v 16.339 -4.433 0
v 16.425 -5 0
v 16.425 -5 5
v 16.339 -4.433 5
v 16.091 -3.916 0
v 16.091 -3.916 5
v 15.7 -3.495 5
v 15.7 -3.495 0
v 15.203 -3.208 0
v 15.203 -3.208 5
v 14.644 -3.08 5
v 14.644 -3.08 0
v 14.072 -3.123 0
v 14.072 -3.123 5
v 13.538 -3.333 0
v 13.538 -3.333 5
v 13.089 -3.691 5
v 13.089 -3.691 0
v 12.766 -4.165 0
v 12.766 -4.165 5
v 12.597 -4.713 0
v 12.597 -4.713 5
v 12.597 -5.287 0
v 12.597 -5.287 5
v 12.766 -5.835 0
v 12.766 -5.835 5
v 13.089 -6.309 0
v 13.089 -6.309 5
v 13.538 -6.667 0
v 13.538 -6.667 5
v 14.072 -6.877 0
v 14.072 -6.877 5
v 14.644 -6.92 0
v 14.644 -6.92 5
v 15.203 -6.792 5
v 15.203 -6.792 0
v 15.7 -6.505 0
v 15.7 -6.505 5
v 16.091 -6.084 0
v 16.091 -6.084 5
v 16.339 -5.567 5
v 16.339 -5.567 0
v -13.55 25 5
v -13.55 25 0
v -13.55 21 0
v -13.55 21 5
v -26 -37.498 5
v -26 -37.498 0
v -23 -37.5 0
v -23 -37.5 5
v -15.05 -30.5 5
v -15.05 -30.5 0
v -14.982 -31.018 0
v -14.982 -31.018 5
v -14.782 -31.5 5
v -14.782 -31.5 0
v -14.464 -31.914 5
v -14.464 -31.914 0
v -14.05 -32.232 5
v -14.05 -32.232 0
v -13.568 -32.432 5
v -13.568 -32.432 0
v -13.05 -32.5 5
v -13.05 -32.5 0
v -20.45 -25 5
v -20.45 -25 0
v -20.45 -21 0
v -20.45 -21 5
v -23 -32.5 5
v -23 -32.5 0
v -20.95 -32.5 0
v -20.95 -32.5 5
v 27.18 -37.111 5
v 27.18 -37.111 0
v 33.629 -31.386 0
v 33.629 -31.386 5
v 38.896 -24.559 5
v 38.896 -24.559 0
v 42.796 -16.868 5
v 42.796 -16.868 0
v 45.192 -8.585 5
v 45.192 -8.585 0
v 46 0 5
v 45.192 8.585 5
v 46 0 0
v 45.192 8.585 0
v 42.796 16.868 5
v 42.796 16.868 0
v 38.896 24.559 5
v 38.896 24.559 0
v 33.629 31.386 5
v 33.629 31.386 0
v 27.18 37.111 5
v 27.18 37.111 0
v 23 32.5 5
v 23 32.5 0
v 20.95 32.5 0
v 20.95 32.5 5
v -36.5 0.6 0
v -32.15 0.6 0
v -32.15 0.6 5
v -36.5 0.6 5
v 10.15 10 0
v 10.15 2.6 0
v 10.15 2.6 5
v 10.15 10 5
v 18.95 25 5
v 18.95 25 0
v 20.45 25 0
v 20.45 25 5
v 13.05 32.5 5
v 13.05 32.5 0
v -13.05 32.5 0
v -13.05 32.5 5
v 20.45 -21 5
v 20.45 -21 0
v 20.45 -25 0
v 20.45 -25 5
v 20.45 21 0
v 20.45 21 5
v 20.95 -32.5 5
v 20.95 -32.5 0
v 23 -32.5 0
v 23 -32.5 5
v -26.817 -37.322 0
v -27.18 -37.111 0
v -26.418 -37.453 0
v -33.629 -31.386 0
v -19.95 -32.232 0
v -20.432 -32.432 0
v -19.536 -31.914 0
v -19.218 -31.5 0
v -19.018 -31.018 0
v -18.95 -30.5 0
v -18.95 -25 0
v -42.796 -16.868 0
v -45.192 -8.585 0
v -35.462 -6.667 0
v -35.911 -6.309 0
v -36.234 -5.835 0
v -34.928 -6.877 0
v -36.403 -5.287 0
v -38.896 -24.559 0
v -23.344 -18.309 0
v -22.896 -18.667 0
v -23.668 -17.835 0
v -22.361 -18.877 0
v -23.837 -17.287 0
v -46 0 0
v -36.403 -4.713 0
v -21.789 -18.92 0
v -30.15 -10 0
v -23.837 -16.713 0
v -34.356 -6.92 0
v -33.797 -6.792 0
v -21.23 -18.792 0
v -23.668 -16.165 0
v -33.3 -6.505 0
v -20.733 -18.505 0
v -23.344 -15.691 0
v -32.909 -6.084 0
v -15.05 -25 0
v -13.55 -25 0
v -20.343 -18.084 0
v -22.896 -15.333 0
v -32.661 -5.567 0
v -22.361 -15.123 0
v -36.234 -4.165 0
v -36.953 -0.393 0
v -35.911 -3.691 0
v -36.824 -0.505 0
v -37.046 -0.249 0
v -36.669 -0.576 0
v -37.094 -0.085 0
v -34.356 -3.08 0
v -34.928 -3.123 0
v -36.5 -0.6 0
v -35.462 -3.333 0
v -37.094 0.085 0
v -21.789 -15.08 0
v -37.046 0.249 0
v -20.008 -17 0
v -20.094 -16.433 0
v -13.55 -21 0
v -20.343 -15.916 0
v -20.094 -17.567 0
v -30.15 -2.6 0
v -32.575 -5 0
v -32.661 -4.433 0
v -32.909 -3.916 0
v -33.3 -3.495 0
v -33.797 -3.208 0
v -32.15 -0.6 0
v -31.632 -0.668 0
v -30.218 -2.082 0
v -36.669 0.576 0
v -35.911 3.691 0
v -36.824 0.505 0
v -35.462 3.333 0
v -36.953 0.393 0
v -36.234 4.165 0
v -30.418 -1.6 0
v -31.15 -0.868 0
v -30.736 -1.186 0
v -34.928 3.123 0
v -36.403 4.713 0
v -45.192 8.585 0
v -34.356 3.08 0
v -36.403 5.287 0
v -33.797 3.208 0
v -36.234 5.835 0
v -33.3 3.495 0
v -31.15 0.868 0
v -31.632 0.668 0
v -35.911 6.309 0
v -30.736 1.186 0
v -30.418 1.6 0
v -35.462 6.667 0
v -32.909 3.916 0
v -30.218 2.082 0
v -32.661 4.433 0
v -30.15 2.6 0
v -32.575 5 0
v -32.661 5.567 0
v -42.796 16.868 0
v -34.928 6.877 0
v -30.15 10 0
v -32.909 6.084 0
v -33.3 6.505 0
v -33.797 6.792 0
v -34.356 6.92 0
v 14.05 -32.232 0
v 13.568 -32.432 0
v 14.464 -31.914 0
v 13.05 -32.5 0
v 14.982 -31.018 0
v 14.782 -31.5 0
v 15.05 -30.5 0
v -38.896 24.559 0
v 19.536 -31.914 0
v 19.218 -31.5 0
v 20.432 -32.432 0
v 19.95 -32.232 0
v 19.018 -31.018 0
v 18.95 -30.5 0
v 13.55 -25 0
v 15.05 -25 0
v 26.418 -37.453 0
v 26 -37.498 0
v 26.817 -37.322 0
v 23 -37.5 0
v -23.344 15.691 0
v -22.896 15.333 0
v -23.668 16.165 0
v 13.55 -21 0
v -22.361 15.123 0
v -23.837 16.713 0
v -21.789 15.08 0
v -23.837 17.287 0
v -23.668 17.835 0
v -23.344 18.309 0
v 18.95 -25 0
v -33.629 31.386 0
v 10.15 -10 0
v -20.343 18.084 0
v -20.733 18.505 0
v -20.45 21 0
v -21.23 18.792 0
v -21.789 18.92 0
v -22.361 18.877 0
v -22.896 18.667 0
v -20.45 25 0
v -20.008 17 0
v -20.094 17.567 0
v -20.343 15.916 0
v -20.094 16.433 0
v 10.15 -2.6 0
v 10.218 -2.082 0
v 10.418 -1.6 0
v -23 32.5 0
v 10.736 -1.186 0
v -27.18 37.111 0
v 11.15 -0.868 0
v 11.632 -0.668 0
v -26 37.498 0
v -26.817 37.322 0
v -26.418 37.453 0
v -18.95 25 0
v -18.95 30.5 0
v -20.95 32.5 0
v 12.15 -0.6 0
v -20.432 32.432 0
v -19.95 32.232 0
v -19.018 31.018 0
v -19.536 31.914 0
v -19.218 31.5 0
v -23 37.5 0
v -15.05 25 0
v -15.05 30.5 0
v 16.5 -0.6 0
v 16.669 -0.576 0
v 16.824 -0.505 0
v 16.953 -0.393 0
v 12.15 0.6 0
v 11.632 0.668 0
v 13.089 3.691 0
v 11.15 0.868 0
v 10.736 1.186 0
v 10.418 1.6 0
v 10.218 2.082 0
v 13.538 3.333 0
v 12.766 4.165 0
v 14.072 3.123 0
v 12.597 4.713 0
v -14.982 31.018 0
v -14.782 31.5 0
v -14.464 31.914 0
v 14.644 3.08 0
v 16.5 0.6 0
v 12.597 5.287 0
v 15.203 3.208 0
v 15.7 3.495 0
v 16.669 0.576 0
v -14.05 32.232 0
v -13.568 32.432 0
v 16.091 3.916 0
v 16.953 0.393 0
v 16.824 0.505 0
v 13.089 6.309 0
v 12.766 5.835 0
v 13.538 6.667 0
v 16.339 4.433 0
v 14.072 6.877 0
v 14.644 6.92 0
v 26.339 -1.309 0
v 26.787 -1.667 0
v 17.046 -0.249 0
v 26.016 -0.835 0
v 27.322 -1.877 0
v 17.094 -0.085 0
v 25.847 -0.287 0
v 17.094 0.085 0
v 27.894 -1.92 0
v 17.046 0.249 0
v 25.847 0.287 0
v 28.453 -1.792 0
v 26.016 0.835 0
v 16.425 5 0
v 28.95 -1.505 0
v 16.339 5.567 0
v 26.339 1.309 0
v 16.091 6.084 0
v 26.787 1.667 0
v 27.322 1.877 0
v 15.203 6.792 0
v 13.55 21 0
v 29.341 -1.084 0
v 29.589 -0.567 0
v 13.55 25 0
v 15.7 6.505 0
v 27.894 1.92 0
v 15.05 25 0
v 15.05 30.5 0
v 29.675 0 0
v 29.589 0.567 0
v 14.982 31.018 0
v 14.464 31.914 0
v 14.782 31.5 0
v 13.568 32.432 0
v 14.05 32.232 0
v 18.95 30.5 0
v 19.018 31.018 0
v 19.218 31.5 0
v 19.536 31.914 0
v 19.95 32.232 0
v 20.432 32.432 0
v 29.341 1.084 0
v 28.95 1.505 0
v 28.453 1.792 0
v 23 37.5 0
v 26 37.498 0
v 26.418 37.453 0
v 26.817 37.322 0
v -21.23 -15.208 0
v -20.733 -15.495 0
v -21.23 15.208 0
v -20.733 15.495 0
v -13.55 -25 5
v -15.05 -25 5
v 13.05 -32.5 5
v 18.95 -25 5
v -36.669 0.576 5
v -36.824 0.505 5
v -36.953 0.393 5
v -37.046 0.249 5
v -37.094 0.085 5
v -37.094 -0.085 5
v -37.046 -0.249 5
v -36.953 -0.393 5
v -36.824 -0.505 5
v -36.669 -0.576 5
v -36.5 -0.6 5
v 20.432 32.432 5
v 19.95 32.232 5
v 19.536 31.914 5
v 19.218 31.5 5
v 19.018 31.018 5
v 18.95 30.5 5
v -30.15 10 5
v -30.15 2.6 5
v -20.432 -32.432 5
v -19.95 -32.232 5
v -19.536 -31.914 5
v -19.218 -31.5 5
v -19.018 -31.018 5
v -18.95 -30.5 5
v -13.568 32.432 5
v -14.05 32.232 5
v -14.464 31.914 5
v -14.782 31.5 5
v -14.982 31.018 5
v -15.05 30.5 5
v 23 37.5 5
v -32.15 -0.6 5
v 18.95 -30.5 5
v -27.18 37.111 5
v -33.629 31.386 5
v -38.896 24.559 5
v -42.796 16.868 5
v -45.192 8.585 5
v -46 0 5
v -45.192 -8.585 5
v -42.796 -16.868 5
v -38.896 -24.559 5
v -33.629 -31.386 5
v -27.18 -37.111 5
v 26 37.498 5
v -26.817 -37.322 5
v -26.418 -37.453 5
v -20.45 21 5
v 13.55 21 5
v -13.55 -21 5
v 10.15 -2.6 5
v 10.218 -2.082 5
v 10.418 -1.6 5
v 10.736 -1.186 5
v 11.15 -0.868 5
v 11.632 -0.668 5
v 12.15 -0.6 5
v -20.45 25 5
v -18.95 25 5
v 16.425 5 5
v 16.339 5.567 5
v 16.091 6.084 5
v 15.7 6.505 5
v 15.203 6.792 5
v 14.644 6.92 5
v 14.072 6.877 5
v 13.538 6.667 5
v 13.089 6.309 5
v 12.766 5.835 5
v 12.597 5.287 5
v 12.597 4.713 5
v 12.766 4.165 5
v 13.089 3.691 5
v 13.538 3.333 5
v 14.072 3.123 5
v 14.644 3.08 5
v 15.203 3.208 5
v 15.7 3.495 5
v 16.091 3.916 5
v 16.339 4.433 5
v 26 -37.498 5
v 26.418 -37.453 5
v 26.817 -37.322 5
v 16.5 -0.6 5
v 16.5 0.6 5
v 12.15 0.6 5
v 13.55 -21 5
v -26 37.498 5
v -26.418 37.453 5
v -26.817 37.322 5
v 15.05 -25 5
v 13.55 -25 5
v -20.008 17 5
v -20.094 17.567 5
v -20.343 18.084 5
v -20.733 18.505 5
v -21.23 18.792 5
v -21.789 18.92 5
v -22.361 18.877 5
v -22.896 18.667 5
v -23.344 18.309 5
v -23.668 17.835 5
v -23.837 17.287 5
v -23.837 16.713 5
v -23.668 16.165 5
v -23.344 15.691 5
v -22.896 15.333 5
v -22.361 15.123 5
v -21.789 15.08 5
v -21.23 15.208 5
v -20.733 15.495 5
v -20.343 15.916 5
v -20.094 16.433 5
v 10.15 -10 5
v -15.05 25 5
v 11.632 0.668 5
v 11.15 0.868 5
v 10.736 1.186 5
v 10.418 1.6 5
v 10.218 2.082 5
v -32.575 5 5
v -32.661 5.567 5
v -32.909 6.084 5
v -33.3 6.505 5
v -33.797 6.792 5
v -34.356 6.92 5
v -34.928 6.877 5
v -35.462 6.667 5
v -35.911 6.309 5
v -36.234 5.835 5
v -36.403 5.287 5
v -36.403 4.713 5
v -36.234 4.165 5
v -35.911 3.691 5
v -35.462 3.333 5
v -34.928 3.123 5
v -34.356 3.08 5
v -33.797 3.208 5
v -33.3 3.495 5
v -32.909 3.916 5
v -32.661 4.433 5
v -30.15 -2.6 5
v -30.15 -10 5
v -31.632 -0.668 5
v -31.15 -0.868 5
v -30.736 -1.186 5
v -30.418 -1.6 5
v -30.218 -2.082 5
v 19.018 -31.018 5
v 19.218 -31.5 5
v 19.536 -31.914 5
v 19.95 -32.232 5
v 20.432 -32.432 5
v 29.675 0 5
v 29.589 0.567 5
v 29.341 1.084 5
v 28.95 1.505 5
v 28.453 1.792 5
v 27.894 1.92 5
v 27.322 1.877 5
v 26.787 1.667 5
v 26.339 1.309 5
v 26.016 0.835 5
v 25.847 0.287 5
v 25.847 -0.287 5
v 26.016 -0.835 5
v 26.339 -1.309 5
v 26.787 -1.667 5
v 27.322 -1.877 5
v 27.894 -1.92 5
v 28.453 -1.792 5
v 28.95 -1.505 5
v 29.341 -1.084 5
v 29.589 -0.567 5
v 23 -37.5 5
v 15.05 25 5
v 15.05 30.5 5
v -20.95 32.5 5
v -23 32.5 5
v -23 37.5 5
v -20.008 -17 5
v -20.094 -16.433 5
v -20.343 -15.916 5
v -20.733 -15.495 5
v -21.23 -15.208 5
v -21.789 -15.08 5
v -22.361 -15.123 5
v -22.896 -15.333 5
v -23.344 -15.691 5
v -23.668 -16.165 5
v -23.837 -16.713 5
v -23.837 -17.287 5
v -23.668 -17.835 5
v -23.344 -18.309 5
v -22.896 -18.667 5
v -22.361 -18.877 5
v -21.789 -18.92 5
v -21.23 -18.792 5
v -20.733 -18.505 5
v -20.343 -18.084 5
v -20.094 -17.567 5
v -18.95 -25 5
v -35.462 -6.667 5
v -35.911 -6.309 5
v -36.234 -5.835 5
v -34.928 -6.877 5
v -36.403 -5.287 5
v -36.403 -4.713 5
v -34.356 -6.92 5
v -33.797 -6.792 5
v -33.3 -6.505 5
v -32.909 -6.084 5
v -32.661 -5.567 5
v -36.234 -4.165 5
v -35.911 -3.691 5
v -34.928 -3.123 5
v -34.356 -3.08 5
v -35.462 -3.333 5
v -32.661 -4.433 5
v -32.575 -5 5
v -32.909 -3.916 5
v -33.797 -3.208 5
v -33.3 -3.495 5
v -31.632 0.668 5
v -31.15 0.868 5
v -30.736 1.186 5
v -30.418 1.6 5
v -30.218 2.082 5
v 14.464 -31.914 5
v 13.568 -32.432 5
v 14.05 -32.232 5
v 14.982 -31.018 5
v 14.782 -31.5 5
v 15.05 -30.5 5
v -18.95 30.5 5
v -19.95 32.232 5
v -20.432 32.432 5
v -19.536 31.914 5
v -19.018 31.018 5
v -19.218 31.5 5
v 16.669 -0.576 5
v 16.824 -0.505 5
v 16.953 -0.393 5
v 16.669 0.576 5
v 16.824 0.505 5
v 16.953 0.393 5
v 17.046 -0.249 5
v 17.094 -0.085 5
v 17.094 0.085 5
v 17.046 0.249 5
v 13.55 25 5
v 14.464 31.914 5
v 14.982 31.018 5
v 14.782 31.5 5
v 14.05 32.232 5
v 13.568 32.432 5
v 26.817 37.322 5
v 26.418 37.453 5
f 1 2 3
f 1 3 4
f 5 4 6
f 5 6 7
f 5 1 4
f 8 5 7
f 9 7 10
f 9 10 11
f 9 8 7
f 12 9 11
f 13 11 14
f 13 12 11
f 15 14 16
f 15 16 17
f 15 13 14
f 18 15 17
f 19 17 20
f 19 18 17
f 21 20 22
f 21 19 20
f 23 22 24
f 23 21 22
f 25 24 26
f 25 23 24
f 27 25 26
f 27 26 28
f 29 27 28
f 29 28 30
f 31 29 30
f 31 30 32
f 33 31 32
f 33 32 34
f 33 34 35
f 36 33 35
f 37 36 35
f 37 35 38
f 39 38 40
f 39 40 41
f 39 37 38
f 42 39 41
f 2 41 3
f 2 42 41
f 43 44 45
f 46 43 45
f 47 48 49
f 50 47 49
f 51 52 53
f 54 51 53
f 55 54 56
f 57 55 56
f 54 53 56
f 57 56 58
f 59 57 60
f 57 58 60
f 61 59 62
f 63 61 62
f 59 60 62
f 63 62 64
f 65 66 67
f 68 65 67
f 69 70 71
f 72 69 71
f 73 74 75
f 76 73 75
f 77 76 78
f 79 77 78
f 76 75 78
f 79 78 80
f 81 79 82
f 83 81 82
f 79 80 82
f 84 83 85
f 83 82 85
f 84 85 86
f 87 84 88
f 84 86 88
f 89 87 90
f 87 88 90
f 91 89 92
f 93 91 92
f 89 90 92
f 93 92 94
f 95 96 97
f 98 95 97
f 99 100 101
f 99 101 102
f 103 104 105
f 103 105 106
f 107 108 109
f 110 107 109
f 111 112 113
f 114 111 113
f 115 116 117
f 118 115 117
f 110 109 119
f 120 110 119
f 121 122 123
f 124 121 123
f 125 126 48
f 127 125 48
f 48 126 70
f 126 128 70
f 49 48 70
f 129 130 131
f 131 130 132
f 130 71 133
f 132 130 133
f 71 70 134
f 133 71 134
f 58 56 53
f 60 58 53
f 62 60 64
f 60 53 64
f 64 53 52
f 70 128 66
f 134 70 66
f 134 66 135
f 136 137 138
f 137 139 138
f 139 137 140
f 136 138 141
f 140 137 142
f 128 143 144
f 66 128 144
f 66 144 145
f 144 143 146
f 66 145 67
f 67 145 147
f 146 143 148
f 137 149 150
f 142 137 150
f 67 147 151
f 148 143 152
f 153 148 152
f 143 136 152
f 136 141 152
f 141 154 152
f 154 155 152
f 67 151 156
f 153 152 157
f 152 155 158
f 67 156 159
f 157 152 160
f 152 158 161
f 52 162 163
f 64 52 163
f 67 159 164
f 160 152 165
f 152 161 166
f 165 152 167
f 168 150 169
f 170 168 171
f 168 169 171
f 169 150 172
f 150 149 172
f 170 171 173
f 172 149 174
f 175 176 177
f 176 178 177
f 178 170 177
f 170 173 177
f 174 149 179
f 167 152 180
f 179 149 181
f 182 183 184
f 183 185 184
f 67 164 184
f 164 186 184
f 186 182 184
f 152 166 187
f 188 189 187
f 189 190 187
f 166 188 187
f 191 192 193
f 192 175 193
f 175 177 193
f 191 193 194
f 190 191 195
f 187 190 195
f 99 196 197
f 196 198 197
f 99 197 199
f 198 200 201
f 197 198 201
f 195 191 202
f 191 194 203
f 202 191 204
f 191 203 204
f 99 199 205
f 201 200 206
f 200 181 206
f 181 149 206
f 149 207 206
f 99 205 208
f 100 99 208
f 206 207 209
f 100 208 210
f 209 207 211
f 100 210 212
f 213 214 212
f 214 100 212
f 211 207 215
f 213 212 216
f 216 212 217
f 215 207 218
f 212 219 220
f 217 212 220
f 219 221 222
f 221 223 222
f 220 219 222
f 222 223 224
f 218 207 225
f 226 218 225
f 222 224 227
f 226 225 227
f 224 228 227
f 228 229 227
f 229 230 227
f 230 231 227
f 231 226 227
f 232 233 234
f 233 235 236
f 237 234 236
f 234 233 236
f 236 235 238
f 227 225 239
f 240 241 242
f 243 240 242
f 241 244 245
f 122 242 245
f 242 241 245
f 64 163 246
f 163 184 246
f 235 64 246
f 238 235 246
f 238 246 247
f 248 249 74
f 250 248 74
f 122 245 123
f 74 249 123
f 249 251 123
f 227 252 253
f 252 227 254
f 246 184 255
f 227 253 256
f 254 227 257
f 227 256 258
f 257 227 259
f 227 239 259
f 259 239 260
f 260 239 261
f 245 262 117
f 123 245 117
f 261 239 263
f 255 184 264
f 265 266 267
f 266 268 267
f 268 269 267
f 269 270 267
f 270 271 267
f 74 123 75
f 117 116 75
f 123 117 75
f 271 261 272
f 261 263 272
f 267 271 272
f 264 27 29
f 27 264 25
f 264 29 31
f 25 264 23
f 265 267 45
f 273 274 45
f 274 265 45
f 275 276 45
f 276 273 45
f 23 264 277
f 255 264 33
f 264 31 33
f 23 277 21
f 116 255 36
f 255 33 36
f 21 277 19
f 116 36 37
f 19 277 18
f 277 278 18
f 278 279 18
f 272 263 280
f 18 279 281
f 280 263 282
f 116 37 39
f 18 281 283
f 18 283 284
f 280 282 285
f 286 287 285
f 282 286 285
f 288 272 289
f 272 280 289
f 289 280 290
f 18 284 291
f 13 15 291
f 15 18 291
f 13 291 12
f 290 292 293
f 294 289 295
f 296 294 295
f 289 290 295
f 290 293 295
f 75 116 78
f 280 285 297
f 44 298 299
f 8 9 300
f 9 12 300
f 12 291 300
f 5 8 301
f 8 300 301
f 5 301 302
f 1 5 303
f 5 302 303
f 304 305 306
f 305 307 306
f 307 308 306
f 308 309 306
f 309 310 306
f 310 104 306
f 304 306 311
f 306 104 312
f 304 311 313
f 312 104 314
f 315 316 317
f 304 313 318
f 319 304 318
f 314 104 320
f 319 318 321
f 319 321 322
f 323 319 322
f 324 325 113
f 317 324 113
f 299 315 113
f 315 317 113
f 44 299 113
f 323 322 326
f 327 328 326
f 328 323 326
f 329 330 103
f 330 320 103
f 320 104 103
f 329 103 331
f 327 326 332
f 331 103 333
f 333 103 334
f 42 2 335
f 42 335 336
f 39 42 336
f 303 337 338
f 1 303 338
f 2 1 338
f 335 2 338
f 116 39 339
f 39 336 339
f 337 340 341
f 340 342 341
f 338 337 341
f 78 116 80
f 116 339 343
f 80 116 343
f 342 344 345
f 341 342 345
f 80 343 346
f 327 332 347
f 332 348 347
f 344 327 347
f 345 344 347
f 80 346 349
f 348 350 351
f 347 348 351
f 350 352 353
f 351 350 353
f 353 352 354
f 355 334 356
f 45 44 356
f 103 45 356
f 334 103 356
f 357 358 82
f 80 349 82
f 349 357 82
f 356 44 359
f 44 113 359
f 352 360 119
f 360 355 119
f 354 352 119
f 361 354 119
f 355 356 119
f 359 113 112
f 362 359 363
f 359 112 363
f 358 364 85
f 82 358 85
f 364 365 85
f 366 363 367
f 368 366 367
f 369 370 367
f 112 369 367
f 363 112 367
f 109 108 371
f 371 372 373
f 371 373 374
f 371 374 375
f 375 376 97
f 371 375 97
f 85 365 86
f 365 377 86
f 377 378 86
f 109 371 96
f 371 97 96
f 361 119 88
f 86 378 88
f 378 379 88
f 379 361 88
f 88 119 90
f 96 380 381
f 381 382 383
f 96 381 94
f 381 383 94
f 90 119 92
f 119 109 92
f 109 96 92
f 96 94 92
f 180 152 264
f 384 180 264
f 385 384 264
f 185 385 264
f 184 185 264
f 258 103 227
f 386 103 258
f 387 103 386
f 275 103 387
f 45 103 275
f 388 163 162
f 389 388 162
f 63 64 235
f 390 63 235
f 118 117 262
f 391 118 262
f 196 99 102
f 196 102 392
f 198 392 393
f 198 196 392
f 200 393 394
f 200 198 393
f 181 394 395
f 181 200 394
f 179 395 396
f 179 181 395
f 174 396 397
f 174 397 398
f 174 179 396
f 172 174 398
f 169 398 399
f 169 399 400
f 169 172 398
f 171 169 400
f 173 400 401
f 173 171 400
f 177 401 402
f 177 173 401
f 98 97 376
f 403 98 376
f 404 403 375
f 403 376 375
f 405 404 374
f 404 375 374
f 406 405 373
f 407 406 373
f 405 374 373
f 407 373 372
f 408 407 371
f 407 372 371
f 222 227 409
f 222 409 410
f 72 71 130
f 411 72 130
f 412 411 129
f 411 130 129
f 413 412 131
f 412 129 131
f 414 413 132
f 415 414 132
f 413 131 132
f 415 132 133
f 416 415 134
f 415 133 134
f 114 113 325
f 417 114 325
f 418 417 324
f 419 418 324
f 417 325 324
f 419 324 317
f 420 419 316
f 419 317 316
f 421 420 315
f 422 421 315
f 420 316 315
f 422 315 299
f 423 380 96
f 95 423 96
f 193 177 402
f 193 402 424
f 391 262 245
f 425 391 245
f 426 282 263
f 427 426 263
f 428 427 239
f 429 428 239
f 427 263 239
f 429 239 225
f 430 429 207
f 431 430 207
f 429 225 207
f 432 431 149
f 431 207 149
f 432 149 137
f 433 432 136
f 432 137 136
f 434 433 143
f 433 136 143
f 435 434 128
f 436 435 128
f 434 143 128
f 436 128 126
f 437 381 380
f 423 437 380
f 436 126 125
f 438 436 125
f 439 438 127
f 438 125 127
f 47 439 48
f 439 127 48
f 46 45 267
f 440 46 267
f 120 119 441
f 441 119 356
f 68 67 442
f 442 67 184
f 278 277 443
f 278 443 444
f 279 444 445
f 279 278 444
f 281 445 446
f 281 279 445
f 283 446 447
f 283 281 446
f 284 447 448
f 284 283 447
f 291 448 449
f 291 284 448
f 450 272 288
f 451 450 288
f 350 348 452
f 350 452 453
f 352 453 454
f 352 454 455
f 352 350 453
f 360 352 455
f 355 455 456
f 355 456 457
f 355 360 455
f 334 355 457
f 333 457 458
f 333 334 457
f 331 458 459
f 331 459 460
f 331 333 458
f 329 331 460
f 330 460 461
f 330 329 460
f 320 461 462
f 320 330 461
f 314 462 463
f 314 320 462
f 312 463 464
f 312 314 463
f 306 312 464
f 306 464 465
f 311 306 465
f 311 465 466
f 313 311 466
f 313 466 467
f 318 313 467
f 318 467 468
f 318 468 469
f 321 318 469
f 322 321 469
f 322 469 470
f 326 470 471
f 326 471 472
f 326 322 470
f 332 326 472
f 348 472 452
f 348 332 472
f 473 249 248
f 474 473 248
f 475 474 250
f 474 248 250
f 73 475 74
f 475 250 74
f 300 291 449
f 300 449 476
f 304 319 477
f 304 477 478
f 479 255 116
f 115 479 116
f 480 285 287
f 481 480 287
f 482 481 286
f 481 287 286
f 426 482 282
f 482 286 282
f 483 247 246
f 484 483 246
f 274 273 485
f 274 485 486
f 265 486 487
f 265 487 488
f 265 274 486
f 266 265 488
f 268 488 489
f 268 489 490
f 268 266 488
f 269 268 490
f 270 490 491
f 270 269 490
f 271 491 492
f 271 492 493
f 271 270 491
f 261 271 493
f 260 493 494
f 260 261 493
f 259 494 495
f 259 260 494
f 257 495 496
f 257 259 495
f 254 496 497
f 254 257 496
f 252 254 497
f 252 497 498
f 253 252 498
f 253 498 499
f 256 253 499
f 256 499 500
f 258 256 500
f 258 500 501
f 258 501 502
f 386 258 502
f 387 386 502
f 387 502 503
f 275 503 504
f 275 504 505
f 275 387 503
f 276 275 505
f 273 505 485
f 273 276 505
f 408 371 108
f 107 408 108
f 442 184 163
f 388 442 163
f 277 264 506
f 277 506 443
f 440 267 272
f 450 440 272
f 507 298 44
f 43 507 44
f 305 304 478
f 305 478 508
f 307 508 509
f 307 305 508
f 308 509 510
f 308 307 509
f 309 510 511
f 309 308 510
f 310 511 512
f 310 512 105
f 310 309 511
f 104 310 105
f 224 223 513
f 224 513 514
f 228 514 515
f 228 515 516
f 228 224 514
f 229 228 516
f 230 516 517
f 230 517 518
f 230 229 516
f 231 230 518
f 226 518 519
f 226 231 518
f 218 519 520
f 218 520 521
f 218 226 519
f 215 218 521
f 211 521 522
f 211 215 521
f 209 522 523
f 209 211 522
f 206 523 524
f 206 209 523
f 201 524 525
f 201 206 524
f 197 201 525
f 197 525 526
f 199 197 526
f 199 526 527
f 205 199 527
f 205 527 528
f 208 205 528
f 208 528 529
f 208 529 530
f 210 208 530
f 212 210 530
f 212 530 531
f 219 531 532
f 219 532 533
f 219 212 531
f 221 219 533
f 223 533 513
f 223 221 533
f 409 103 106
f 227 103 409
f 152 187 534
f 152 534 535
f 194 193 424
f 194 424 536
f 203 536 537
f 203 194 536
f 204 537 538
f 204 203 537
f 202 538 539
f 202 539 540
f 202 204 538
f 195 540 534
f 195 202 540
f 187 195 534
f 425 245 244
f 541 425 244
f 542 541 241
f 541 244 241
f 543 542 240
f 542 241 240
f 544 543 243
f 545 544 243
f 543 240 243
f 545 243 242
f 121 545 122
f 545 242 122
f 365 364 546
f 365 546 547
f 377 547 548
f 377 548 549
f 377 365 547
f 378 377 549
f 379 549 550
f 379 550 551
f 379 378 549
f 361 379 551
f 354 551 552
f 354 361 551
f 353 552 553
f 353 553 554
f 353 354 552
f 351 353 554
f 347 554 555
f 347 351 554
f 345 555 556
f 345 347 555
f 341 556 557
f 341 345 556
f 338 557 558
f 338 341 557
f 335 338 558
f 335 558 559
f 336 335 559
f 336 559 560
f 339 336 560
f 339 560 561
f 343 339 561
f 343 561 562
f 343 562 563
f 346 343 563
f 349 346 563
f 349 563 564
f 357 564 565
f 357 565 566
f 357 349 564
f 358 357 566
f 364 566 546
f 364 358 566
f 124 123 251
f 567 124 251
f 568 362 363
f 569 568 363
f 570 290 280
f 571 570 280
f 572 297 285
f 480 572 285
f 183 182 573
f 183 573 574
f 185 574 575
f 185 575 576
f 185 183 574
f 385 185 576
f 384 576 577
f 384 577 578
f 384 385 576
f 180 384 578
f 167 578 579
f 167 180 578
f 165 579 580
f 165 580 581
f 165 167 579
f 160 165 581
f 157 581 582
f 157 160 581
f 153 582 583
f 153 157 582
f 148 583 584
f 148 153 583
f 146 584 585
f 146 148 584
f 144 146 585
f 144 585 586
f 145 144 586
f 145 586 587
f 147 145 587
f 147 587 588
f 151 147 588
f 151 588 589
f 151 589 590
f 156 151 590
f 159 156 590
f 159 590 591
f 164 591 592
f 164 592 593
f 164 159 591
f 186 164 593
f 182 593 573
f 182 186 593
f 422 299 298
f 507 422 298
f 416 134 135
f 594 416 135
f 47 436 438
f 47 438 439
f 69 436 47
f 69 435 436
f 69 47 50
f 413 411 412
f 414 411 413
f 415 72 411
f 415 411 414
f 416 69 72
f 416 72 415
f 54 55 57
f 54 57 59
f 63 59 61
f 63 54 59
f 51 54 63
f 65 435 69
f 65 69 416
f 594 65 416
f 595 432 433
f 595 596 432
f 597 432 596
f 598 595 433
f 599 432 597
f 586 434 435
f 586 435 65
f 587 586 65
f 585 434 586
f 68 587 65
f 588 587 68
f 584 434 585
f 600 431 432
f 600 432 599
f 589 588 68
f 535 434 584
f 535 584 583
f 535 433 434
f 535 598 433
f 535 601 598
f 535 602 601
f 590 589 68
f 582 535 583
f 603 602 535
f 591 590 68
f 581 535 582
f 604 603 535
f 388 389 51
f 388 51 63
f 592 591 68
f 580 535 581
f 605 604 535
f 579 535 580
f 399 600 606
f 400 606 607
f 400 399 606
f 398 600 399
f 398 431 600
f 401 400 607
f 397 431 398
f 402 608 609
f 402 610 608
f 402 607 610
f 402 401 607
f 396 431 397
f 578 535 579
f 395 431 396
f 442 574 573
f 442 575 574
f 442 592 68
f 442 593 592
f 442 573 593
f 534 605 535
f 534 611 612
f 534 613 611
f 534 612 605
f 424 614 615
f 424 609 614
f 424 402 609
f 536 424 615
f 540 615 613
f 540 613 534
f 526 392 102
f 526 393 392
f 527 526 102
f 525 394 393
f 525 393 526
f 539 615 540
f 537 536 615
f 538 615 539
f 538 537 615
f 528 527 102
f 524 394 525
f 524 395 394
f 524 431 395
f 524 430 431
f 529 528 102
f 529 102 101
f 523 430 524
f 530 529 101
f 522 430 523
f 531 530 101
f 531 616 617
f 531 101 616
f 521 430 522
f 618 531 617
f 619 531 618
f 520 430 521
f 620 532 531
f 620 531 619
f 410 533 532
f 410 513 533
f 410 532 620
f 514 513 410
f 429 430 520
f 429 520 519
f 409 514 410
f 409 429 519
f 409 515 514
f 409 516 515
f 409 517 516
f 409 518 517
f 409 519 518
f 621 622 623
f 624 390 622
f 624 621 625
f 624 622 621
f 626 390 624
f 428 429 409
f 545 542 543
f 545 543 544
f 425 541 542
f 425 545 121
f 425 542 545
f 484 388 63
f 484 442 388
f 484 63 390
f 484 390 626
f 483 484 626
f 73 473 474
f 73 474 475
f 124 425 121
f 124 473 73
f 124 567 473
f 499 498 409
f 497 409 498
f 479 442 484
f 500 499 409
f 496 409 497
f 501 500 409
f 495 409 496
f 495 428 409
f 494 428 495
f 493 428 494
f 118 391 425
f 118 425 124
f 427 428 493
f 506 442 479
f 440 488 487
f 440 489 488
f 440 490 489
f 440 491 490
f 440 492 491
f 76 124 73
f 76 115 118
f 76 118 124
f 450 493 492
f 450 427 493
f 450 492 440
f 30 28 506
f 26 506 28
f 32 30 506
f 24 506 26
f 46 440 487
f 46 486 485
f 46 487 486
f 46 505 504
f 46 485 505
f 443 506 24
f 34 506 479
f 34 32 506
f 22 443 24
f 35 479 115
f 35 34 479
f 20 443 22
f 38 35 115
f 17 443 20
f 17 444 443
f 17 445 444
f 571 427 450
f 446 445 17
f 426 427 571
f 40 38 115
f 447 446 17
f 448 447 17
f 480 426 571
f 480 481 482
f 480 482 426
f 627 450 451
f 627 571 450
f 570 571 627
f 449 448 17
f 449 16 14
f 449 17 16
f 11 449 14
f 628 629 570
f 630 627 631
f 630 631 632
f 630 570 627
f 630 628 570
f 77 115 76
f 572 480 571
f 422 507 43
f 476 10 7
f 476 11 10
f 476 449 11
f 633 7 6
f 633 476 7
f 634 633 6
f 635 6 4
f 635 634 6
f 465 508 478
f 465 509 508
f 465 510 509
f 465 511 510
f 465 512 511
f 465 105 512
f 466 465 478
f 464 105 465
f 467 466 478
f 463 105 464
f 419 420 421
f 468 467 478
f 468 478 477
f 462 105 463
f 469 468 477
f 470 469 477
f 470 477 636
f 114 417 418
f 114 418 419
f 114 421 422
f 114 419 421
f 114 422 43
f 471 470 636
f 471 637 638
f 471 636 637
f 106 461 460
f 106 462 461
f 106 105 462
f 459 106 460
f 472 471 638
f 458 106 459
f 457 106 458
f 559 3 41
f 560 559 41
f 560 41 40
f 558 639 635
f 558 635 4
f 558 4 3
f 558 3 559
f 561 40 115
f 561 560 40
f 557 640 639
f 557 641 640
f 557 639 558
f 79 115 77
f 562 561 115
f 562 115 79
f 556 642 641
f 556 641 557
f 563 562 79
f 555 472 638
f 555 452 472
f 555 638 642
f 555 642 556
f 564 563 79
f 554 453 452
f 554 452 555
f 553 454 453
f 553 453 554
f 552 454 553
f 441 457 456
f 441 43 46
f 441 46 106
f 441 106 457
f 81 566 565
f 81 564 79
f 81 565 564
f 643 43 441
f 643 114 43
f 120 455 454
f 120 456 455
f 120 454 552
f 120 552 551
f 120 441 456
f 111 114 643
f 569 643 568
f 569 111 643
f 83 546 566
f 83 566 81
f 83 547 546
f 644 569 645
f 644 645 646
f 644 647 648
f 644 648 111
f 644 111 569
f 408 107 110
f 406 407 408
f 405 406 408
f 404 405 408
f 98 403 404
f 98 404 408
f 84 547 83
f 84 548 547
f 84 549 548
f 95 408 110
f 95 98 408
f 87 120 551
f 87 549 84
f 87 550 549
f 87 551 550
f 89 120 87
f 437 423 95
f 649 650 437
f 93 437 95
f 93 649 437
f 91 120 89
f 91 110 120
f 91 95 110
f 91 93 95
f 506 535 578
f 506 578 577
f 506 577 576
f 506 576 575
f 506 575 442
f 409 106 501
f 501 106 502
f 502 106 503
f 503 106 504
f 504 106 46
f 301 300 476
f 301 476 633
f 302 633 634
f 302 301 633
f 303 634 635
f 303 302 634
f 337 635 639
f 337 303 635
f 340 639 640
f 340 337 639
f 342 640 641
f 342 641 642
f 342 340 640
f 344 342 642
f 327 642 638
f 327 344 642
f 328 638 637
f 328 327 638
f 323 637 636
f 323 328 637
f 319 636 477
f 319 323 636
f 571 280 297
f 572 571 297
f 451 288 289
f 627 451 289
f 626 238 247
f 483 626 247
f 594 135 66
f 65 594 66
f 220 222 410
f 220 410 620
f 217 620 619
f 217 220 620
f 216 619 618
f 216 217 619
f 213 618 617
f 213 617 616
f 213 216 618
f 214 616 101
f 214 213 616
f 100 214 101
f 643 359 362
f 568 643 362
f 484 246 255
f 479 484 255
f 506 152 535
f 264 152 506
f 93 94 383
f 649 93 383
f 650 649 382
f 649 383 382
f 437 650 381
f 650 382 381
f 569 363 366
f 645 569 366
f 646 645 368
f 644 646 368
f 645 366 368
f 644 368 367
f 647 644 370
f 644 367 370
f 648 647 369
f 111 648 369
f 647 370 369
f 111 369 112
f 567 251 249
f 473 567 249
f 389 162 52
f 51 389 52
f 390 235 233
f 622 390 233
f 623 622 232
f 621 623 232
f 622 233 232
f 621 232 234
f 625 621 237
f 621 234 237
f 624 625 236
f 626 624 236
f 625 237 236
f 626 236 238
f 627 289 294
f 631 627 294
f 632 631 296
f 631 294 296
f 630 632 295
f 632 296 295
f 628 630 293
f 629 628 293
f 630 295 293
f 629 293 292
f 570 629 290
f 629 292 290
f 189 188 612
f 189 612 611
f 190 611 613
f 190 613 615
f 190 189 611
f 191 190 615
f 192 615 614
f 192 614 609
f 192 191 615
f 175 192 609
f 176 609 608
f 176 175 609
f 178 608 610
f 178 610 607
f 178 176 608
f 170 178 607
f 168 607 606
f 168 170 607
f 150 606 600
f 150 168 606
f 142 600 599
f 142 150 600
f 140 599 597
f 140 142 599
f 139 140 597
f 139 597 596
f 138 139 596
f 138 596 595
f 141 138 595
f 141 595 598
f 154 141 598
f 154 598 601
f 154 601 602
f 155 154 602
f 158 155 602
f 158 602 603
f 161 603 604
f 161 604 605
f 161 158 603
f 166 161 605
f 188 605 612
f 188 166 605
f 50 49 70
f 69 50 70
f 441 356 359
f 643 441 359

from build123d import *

# Parameters (mm, degrees)
ESQUISSE1_R        = 1.925
BOSS_EXTRU_1_DEPTH = 5


with BuildPart() as part:
    # Esquisse1 → Boss.-Extru.1 (new body)
    with BuildSketch(Plane.XY):
        with BuildLine():
            Line((13.05, 32.5), (-13.05, 32.5))
            ThreePointArc((-13.05, 32.5), (-14.464213562, 31.914213562), (-15.05, 30.5))
            Line((-15.05, 30.5), (-15.05, 25))
            Line((-15.05, 25), (-13.55, 25))
            Line((-13.55, 25), (-13.55, 21))
            Line((-13.55, 21), (-20.45, 21))
            Line((-20.45, 21), (-20.45, 25))
            Line((-20.45, 25), (-18.95, 25))
            Line((-18.95, 25), (-18.95, 30.5))
            ThreePointArc((-18.95, 30.5), (-19.535786438, 31.914213562), (-20.95, 32.5))
            Line((-20.95, 32.5), (-23, 32.5))
            Line((-23, 32.5), (-23, 37.5))
            Line((-23, 37.5), (-25.999999067, 37.497633905))
            ThreePointArc((-25.999999067, 37.497633905), (-26.620839292, 37.398317642), (-27.180168114, 37.111163374))
            ThreePointArc((-27.180168114, 37.111163374), (-45.999999844, 0), (-27.180168114, -37.111163374))
            ThreePointArc((-27.180168114, -37.111163374), (-26.620839292, -37.398317642), (-25.999999067, -37.497633905))
            Line((-25.999999067, -37.497633905), (-23, -37.5))
            Line((-23, -37.5), (-23, -32.5))
            Line((-23, -32.5), (-20.95, -32.5))
            ThreePointArc((-20.95, -32.5), (-19.535786438, -31.914213562), (-18.95, -30.5))
            Line((-18.95, -30.5), (-18.95, -25))
            Line((-18.95, -25), (-20.45, -25))
            Line((-20.45, -25), (-20.45, -21))
            Line((-20.45, -21), (-13.55, -21))
            Line((-13.55, -21), (-13.55, -25))
            Line((-13.55, -25), (-15.05, -25))
            Line((-15.05, -25), (-15.05, -30.5))
            ThreePointArc((-15.05, -30.5), (-14.464213562, -31.914213562), (-13.05, -32.5))
            Line((-13.05, -32.5), (13.05, -32.5))
            ThreePointArc((13.05, -32.5), (14.464213562, -31.914213562), (15.05, -30.5))
            Line((15.05, -30.5), (15.05, -25))
            Line((15.05, -25), (13.55, -25))
            Line((13.55, -25), (13.55, -21))
            Line((13.55, -21), (20.45, -21))
            Line((20.45, -21), (20.45, -25))
            Line((20.45, -25), (18.95, -25))
            Line((18.95, -25), (18.95, -30.5))
            ThreePointArc((18.95, -30.5), (19.535786438, -31.914213562), (20.95, -32.5))
            Line((20.95, -32.5), (23, -32.5))
            Line((23, -32.5), (23, -37.5))
            Line((23, -37.5), (25.999999067, -37.497633905))
            ThreePointArc((25.999999067, -37.497633905), (26.620839292, -37.398317642), (27.180168114, -37.111163374))
            ThreePointArc((27.180168114, -37.111163374), (45.999999844, 0), (27.180168114, 37.111163374))
            ThreePointArc((27.180168114, 37.111163374), (26.620839292, 37.398317642), (25.999999067, 37.497633905))
            Line((25.999999067, 37.497633905), (23, 37.5))
            Line((23, 37.5), (23, 32.5))
            Line((23, 32.5), (20.95, 32.5))
            ThreePointArc((20.95, 32.5), (19.535786438, 31.914213562), (18.95, 30.5))
            Line((18.95, 30.5), (18.95, 25))
            Line((18.95, 25), (20.45, 25))
            Line((20.45, 25), (20.45, 21))
            Line((20.45, 21), (13.55, 21))
            Line((13.55, 21), (13.55, 25))
            Line((13.55, 25), (15.05, 25))
            Line((15.05, 25), (15.05, 30.5))
            ThreePointArc((15.05, 30.5), (14.464213562, 31.914213562), (13.05, 32.5))
        make_face()
        with Locations((27.75, 0)):
            Circle(ESQUISSE1_R, mode=Mode.SUBTRACT)
        with Locations((-21.933137835, -17)):
            Circle(ESQUISSE1_R, mode=Mode.SUBTRACT)
        with Locations((-21.933137835, 17)):
            Circle(ESQUISSE1_R, mode=Mode.SUBTRACT)
        with Locations((14.500000149, -5)):
            Circle(ESQUISSE1_R, mode=Mode.SUBTRACT)
        with Locations((14.500000149, 5)):
            Circle(ESQUISSE1_R, mode=Mode.SUBTRACT)
        with Locations((-34.499999851, -5)):
            Circle(ESQUISSE1_R, mode=Mode.SUBTRACT)
        with Locations((-34.499999851, 5)):
            Circle(ESQUISSE1_R, mode=Mode.SUBTRACT)
        with BuildLine():
            Line((10.150000149, -10), (10.150000149, -2.6))
            ThreePointArc((10.150000149, -2.6), (10.735786586, -1.185786438), (12.150000149, -0.6))
            Line((12.150000149, -0.6), (16.500000149, -0.6))
            ThreePointArc((16.500000149, -0.6), (17.100000149, 0), (16.500000149, 0.6))
            Line((16.500000149, 0.6), (12.150000149, 0.6))
            ThreePointArc((12.150000149, 0.6), (10.735786586, 1.185786438), (10.150000149, 2.6))
            Line((10.150000149, 2.6), (10.150000149, 10))
            Line((10.150000149, 10), (-30.149999851, 10))
            Line((-30.149999851, 10), (-30.149999851, 2.6))
            ThreePointArc((-30.149999851, 2.6), (-30.735786289, 1.185786438), (-32.149999851, 0.6))
            Line((-32.149999851, 0.6), (-36.499999851, 0.6))
            ThreePointArc((-36.499999851, 0.6), (-37.099999851, 0), (-36.499999851, -0.6))
            Line((-36.499999851, -0.6), (-32.149999851, -0.6))
            ThreePointArc((-32.149999851, -0.6), (-30.735786289, -1.185786438), (-30.149999851, -2.6))
            Line((-30.149999851, -2.6), (-30.149999851, -10))
            Line((-30.149999851, -10), (10.150000149, -10))
        make_face(mode=Mode.SUBTRACT)
    extrude(amount=BOSS_EXTRU_1_DEPTH)


solid = part.part
